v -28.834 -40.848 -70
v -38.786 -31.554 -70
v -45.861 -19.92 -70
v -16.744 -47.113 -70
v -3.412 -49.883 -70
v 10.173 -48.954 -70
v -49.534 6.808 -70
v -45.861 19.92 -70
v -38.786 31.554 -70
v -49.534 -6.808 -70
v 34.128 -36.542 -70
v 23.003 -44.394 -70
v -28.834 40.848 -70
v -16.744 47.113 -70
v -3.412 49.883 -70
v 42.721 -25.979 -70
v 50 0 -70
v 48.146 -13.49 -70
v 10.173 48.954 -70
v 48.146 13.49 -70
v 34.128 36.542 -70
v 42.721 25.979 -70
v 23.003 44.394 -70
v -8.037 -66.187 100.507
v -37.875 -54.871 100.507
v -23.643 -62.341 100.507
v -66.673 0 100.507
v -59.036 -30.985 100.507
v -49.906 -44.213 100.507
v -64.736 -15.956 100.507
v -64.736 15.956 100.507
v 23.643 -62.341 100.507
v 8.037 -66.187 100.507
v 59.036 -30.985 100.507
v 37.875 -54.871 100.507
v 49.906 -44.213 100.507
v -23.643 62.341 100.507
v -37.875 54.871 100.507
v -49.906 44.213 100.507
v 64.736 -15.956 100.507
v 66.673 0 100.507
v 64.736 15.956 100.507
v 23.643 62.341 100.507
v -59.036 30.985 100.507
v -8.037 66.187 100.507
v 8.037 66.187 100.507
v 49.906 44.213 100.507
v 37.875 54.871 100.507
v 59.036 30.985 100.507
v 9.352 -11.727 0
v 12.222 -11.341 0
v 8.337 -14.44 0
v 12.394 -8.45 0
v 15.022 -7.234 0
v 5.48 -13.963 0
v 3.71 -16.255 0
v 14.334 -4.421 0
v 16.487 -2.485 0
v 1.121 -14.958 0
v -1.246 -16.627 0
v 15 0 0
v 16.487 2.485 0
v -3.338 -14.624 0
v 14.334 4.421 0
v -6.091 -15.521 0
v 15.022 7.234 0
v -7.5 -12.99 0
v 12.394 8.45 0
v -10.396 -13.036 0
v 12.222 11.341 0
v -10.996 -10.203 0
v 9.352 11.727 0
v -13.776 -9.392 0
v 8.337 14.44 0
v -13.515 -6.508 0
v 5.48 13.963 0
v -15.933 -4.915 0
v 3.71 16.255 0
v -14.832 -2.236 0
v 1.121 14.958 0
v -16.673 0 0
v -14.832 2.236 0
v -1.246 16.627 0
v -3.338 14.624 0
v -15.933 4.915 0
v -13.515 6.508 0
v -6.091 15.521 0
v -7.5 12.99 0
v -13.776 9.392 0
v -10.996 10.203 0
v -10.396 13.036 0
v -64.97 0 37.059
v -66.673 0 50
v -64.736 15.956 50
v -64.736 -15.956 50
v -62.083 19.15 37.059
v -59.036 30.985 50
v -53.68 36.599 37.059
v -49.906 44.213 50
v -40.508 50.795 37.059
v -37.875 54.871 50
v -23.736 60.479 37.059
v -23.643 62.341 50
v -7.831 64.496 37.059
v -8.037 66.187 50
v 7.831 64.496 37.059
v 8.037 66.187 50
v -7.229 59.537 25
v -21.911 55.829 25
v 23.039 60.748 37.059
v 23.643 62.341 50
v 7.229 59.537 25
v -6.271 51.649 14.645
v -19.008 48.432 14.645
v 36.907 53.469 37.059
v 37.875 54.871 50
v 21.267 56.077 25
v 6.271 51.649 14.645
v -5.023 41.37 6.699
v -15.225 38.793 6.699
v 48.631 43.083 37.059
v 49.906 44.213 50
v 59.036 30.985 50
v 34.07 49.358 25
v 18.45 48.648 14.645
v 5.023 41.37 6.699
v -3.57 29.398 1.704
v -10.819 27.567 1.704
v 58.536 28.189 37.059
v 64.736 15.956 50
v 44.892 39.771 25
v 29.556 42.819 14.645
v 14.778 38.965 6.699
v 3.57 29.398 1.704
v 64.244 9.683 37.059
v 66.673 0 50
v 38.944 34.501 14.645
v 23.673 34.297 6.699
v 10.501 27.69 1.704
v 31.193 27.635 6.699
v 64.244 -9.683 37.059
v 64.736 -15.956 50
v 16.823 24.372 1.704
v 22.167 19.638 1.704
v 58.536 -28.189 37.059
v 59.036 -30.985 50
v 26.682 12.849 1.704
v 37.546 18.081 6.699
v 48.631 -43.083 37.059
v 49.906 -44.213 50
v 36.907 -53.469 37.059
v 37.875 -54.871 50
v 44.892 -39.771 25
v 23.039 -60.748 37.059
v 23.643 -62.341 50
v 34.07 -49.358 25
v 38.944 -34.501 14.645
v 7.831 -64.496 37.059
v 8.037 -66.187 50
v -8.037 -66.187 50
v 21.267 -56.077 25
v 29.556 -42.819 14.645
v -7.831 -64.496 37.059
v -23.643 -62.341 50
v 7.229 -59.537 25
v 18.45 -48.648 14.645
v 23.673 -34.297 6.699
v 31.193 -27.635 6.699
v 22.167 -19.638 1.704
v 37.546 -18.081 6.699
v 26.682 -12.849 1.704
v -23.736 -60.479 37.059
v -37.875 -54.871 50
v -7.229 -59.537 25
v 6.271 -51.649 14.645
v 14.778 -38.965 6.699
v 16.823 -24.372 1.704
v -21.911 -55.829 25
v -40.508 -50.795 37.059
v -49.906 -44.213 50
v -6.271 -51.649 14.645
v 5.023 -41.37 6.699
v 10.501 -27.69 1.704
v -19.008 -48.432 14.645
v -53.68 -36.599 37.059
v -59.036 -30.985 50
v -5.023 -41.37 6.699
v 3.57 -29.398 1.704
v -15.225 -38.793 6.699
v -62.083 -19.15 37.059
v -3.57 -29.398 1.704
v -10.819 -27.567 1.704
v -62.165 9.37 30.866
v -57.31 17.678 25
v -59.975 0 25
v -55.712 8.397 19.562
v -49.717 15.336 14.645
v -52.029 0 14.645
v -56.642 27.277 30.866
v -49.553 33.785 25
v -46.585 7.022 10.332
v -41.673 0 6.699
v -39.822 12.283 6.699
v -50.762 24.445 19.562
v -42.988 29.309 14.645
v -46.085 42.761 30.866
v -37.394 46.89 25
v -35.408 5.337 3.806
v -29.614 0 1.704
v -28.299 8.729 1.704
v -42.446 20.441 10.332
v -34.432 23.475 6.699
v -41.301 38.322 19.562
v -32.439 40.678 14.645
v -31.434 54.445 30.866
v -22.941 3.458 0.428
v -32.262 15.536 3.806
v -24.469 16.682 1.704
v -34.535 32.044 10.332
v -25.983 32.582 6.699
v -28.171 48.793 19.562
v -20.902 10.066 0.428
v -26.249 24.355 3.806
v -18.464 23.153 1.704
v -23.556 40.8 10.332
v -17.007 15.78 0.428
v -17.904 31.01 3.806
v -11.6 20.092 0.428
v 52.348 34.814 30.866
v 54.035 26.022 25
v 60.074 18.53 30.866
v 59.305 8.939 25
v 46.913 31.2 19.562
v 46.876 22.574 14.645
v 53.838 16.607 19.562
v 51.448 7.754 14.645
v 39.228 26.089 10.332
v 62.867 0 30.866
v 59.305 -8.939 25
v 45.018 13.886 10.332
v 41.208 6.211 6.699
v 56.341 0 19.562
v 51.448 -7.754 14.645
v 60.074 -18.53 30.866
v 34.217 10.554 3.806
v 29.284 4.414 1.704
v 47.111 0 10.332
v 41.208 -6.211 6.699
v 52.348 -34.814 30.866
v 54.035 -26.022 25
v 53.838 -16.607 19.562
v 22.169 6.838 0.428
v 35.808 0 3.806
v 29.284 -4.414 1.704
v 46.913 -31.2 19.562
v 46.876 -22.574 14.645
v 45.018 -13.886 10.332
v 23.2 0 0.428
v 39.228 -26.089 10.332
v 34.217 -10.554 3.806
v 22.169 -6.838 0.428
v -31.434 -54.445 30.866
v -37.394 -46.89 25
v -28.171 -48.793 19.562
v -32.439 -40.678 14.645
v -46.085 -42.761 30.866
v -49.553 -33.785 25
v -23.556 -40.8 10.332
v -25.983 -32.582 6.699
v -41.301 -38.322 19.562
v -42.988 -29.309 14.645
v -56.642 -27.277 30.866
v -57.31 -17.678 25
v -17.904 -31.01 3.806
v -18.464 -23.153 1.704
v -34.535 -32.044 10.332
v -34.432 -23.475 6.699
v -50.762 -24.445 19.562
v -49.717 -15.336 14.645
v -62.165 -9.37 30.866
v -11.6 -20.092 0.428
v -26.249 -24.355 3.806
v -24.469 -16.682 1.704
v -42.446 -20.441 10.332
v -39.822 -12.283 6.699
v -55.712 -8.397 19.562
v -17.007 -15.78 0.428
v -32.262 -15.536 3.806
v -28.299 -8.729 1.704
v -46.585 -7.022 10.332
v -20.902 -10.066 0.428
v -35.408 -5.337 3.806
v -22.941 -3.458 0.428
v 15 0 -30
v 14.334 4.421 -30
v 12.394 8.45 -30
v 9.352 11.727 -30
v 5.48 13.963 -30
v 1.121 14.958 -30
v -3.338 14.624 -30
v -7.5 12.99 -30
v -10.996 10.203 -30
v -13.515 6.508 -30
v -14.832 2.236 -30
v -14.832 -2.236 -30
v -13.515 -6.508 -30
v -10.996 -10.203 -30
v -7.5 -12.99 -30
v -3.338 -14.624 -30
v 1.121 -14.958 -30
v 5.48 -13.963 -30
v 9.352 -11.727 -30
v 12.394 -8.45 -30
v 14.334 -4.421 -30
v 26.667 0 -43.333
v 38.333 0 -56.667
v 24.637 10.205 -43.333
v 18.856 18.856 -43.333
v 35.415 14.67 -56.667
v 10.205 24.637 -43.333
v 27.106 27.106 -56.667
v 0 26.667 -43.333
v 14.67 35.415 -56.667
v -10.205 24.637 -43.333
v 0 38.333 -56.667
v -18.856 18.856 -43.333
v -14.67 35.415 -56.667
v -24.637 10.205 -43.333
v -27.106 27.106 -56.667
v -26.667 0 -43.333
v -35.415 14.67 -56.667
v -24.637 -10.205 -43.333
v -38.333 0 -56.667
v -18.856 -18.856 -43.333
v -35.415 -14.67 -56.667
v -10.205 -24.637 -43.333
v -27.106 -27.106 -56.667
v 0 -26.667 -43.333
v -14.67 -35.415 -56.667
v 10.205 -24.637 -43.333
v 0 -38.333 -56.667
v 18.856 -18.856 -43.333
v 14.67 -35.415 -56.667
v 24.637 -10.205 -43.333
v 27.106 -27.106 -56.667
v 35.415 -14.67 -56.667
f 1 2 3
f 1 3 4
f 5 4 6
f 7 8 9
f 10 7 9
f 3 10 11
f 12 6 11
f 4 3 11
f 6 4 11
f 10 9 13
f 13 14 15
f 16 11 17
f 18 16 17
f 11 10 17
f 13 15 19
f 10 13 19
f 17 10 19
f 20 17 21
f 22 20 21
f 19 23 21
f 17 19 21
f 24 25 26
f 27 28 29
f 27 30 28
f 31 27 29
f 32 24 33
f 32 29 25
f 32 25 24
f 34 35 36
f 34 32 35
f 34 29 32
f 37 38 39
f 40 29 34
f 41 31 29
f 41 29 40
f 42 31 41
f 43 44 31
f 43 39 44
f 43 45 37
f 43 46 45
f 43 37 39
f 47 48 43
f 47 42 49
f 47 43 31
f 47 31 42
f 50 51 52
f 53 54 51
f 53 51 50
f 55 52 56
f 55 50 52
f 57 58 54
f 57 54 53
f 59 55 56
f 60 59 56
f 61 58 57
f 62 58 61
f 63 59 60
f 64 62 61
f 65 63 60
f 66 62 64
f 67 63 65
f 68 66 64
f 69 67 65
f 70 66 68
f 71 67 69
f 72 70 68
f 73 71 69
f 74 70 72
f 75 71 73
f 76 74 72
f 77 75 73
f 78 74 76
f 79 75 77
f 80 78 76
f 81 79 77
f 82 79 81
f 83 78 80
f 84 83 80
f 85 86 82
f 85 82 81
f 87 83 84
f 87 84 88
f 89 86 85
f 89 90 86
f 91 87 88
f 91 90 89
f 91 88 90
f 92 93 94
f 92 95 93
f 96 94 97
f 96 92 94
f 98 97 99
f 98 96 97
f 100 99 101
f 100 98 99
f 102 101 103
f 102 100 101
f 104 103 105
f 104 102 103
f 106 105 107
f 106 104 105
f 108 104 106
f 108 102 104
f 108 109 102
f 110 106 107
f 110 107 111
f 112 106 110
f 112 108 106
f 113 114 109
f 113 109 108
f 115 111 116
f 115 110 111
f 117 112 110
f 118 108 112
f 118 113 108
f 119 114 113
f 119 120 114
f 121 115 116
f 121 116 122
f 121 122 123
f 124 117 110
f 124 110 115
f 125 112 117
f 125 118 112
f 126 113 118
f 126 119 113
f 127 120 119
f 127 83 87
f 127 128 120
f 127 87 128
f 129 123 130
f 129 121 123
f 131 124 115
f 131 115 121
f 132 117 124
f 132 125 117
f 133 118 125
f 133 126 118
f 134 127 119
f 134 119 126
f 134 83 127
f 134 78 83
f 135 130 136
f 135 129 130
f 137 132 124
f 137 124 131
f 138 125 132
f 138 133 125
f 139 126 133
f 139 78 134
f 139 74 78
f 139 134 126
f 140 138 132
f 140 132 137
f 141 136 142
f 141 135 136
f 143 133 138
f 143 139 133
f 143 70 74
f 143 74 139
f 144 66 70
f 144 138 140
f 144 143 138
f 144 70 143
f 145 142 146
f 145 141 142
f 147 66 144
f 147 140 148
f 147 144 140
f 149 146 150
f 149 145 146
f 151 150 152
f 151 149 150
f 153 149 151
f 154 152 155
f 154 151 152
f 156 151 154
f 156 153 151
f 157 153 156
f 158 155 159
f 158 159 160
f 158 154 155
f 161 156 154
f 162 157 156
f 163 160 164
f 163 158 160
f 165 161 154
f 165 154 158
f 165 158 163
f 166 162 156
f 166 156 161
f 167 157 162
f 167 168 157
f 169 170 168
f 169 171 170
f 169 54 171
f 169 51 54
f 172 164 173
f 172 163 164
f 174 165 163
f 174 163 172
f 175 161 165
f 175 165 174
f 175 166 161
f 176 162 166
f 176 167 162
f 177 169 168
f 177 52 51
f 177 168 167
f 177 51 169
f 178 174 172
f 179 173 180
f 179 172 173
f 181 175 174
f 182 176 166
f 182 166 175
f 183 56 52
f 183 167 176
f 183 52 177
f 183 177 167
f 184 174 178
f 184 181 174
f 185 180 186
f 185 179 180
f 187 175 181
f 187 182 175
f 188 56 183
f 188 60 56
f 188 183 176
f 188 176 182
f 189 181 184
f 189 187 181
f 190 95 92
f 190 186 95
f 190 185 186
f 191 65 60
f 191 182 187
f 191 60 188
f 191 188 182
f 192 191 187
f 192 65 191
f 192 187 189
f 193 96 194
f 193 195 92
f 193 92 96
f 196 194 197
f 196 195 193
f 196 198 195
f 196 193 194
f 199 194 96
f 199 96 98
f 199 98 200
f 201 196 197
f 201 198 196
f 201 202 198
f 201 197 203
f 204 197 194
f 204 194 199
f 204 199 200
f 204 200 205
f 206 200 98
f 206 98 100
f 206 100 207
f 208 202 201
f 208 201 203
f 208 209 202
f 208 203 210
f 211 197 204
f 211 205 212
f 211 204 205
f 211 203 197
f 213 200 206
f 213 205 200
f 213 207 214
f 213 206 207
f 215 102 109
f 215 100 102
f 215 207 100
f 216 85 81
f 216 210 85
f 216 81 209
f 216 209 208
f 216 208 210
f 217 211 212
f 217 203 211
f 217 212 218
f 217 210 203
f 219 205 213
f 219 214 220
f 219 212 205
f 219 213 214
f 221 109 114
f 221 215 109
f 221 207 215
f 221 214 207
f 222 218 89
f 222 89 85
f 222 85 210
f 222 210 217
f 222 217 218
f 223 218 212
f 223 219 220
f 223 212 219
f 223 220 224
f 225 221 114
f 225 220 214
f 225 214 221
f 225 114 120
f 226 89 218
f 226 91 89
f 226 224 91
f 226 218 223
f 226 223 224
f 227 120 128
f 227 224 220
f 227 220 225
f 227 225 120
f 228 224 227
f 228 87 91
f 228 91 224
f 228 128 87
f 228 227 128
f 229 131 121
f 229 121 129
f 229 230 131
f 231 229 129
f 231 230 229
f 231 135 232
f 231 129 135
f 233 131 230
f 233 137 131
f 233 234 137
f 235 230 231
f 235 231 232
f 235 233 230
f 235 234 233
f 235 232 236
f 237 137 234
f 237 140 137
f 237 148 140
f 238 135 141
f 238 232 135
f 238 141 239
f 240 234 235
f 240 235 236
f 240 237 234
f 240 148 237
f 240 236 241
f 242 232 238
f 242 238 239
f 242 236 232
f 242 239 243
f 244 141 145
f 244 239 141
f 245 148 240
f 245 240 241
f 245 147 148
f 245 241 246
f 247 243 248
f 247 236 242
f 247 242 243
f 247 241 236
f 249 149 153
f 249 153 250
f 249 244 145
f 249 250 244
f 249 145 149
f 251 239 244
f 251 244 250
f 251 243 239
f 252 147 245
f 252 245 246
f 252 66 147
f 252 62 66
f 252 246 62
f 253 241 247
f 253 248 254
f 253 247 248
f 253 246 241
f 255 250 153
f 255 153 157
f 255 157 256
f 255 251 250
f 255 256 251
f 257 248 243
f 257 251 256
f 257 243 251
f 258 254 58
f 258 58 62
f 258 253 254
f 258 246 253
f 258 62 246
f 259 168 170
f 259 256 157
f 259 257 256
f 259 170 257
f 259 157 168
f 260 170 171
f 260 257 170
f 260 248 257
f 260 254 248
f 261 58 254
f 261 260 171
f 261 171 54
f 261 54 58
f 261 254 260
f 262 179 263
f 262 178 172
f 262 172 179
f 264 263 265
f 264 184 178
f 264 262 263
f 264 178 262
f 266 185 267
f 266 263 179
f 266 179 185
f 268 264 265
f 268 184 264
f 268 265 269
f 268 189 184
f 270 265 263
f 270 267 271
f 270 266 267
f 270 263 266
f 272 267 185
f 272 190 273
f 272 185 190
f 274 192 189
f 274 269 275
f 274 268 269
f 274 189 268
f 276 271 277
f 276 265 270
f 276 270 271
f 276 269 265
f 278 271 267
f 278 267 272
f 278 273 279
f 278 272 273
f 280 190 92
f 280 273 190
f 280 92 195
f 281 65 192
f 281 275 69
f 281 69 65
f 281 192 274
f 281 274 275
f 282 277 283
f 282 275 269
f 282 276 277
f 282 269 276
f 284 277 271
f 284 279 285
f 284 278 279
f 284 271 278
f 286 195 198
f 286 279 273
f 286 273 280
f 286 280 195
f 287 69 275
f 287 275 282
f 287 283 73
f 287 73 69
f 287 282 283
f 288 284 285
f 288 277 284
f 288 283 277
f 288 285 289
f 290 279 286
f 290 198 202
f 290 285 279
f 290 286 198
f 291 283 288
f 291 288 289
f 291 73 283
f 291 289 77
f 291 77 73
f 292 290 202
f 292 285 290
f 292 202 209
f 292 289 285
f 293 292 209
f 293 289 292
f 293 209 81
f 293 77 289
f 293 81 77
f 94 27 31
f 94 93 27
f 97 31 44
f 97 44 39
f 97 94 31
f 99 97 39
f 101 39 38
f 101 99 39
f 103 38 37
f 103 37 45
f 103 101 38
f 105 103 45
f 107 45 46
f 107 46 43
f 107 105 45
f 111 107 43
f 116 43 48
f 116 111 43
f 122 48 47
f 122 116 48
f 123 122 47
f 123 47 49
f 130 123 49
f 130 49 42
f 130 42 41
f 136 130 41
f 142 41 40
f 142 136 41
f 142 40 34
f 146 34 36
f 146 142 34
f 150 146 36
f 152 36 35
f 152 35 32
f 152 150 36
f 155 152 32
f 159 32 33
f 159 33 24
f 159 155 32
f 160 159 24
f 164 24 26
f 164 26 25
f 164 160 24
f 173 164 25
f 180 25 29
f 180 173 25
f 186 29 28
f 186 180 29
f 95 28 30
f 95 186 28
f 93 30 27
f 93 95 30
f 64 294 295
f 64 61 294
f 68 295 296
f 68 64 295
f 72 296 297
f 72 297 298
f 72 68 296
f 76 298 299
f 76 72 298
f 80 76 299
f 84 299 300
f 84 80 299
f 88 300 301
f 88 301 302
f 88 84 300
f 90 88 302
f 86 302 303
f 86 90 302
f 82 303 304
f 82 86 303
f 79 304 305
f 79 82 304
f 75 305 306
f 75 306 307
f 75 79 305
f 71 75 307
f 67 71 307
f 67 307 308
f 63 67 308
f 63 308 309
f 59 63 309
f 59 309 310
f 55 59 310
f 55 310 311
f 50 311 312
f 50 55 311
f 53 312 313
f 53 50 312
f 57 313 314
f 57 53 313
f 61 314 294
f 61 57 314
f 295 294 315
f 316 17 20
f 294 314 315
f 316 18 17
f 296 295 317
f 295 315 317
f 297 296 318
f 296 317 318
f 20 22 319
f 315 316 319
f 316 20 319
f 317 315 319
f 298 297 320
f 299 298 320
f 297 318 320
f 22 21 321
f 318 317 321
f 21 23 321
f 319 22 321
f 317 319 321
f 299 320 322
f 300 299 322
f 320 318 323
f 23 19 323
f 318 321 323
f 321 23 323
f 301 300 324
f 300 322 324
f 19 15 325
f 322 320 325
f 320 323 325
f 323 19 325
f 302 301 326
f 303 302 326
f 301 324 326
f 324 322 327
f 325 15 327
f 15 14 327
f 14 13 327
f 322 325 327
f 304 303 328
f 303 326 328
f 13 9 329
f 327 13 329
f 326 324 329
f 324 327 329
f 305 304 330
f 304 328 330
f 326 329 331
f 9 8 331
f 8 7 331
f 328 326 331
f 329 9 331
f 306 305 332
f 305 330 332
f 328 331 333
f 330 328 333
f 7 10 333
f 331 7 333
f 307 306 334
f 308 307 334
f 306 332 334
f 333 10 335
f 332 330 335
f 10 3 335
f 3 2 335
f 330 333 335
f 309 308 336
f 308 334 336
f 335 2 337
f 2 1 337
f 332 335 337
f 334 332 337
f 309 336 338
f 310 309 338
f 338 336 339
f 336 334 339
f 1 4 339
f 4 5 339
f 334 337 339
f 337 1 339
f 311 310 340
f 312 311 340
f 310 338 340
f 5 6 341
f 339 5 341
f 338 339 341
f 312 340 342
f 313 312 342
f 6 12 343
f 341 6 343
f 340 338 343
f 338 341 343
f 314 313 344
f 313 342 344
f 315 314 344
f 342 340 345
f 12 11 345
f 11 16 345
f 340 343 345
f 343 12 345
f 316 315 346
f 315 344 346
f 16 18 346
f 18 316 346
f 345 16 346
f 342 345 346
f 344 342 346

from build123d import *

# Parameters (mm, degrees)
F3_R      = 15
F1_R      = 50
F4_FACE_R = 15
F6_R      = 15


with BuildPart() as f4:
    # F3 (on offset) → F4 section 0
    with BuildSketch(Plane.XY.offset(-30)):
        Circle(F3_R)
    # F1 (on offset) → F4 section 1
    with BuildSketch(Plane.XY.offset(-70)):
        Circle(F1_R)
    loft()

    # F4_face (on face) → F7 section 0
    with BuildSketch(Plane.XY.offset(-30)):
        Circle(F4_FACE_R)
    # F6 (on offset) → F7 section 1
    with BuildSketch(Plane.XY):
        Circle(F6_R)
    loft()

    # F8 (on Front) → F9 (revolve)
    with BuildSketch(Plane.XZ):
        with BuildLine():
            Line((0, 0), (0, 100.507477))
            Line((0, 100.507477), (-66.673411, 100.507477))
            Line((-66.673411, 100.507477), (-66.673411, 50))
            ThreePointArc((-66.673411, 50), (-52.02875, 14.644661), (-16.673411, 0))
            Line((-16.673411, 0), (0, 0))
        make_face()
    revolve(axis=Axis((0, 0, 50.253739), (0, 0, -1)))


solid = f4.part
